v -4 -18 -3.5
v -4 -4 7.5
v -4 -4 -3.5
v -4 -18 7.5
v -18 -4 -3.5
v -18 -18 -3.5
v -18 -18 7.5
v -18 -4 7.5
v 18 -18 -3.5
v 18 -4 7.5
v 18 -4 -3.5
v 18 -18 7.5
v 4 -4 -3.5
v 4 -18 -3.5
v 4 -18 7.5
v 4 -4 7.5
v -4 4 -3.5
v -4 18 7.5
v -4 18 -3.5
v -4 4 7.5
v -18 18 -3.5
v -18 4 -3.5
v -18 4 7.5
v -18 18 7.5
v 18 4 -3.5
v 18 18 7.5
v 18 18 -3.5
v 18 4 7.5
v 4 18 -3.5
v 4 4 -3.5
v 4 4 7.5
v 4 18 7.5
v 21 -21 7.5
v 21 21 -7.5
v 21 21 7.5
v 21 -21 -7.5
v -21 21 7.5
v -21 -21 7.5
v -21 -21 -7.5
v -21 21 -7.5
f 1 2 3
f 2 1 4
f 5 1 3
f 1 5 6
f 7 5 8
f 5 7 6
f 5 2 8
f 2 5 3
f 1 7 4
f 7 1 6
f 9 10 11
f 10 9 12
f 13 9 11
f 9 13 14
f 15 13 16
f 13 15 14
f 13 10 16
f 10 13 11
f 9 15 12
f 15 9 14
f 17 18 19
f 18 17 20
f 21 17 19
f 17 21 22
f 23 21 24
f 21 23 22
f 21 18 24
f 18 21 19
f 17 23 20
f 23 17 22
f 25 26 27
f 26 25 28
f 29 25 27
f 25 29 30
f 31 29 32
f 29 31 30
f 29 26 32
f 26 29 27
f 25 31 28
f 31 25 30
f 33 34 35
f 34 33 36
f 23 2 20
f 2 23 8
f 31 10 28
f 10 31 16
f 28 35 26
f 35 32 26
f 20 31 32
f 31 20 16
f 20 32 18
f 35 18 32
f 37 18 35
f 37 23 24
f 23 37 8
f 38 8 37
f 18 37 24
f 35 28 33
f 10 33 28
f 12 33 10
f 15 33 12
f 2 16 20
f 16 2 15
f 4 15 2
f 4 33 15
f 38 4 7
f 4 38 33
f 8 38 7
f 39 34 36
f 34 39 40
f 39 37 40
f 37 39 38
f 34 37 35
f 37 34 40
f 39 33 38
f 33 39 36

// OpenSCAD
$fn = 32;

// ----------------------------------------------------------------------
// Pocket plate 42 x 42 x 15
// 2 x 2 pockets 14 mm square, 11 mm deep
// ----------------------------------------------------------------------

// --- parameters (mm) ---
thickness = 15;  // plate thickness
floor_t = 4;     // material left under each pocket
pocket = 14;     // pocket side length
pitch_x = 22;    // pocket pitch along X
pitch_y = 22;    // pocket pitch along Y
cols = 2;        // pockets per row
rows = 2;        // rows of pockets

// --- derived feature positions (mm) ---
depth = thickness - floor_t;        // = 11   pocket depth, down to the floor
span_x = (cols - 1) * pitch_x;      // = 22   distance between outer pockets
span_y = (rows - 1) * pitch_y;      // = 22   distance between outer pocket rows
origin_x = -span_x / 2;             // = -11   X of the first pocket
origin_y = -span_y / 2;             // = -11   Y of the first pocket
plate = [span_x + pocket + 6, span_y + pocket + 6, thickness];  // = [42, 42, 15]   overall size: pockets plus 3 mm of wall on each side
feature_centers = [
  [origin_x + 0 * pitch_x, origin_y + 0 * pitch_y],
  [origin_x + 1 * pitch_x, origin_y + 0 * pitch_y],
  [origin_x + 0 * pitch_x, origin_y + 1 * pitch_y],
  [origin_x + 1 * pitch_x, origin_y + 1 * pitch_y]
];   // pocket centres, used verbatim by the cutter loop

// plate outline, then one pocket per centre in feature_centers
difference() {
  cube(plate, center = true);
  for (centre = feature_centers)
    translate([centre[0] - pocket / 2, centre[1] - pocket / 2, plate[2] / 2 - depth])
      cube([pocket, pocket, depth + 1]);  // centred on the declared pocket centre
}
